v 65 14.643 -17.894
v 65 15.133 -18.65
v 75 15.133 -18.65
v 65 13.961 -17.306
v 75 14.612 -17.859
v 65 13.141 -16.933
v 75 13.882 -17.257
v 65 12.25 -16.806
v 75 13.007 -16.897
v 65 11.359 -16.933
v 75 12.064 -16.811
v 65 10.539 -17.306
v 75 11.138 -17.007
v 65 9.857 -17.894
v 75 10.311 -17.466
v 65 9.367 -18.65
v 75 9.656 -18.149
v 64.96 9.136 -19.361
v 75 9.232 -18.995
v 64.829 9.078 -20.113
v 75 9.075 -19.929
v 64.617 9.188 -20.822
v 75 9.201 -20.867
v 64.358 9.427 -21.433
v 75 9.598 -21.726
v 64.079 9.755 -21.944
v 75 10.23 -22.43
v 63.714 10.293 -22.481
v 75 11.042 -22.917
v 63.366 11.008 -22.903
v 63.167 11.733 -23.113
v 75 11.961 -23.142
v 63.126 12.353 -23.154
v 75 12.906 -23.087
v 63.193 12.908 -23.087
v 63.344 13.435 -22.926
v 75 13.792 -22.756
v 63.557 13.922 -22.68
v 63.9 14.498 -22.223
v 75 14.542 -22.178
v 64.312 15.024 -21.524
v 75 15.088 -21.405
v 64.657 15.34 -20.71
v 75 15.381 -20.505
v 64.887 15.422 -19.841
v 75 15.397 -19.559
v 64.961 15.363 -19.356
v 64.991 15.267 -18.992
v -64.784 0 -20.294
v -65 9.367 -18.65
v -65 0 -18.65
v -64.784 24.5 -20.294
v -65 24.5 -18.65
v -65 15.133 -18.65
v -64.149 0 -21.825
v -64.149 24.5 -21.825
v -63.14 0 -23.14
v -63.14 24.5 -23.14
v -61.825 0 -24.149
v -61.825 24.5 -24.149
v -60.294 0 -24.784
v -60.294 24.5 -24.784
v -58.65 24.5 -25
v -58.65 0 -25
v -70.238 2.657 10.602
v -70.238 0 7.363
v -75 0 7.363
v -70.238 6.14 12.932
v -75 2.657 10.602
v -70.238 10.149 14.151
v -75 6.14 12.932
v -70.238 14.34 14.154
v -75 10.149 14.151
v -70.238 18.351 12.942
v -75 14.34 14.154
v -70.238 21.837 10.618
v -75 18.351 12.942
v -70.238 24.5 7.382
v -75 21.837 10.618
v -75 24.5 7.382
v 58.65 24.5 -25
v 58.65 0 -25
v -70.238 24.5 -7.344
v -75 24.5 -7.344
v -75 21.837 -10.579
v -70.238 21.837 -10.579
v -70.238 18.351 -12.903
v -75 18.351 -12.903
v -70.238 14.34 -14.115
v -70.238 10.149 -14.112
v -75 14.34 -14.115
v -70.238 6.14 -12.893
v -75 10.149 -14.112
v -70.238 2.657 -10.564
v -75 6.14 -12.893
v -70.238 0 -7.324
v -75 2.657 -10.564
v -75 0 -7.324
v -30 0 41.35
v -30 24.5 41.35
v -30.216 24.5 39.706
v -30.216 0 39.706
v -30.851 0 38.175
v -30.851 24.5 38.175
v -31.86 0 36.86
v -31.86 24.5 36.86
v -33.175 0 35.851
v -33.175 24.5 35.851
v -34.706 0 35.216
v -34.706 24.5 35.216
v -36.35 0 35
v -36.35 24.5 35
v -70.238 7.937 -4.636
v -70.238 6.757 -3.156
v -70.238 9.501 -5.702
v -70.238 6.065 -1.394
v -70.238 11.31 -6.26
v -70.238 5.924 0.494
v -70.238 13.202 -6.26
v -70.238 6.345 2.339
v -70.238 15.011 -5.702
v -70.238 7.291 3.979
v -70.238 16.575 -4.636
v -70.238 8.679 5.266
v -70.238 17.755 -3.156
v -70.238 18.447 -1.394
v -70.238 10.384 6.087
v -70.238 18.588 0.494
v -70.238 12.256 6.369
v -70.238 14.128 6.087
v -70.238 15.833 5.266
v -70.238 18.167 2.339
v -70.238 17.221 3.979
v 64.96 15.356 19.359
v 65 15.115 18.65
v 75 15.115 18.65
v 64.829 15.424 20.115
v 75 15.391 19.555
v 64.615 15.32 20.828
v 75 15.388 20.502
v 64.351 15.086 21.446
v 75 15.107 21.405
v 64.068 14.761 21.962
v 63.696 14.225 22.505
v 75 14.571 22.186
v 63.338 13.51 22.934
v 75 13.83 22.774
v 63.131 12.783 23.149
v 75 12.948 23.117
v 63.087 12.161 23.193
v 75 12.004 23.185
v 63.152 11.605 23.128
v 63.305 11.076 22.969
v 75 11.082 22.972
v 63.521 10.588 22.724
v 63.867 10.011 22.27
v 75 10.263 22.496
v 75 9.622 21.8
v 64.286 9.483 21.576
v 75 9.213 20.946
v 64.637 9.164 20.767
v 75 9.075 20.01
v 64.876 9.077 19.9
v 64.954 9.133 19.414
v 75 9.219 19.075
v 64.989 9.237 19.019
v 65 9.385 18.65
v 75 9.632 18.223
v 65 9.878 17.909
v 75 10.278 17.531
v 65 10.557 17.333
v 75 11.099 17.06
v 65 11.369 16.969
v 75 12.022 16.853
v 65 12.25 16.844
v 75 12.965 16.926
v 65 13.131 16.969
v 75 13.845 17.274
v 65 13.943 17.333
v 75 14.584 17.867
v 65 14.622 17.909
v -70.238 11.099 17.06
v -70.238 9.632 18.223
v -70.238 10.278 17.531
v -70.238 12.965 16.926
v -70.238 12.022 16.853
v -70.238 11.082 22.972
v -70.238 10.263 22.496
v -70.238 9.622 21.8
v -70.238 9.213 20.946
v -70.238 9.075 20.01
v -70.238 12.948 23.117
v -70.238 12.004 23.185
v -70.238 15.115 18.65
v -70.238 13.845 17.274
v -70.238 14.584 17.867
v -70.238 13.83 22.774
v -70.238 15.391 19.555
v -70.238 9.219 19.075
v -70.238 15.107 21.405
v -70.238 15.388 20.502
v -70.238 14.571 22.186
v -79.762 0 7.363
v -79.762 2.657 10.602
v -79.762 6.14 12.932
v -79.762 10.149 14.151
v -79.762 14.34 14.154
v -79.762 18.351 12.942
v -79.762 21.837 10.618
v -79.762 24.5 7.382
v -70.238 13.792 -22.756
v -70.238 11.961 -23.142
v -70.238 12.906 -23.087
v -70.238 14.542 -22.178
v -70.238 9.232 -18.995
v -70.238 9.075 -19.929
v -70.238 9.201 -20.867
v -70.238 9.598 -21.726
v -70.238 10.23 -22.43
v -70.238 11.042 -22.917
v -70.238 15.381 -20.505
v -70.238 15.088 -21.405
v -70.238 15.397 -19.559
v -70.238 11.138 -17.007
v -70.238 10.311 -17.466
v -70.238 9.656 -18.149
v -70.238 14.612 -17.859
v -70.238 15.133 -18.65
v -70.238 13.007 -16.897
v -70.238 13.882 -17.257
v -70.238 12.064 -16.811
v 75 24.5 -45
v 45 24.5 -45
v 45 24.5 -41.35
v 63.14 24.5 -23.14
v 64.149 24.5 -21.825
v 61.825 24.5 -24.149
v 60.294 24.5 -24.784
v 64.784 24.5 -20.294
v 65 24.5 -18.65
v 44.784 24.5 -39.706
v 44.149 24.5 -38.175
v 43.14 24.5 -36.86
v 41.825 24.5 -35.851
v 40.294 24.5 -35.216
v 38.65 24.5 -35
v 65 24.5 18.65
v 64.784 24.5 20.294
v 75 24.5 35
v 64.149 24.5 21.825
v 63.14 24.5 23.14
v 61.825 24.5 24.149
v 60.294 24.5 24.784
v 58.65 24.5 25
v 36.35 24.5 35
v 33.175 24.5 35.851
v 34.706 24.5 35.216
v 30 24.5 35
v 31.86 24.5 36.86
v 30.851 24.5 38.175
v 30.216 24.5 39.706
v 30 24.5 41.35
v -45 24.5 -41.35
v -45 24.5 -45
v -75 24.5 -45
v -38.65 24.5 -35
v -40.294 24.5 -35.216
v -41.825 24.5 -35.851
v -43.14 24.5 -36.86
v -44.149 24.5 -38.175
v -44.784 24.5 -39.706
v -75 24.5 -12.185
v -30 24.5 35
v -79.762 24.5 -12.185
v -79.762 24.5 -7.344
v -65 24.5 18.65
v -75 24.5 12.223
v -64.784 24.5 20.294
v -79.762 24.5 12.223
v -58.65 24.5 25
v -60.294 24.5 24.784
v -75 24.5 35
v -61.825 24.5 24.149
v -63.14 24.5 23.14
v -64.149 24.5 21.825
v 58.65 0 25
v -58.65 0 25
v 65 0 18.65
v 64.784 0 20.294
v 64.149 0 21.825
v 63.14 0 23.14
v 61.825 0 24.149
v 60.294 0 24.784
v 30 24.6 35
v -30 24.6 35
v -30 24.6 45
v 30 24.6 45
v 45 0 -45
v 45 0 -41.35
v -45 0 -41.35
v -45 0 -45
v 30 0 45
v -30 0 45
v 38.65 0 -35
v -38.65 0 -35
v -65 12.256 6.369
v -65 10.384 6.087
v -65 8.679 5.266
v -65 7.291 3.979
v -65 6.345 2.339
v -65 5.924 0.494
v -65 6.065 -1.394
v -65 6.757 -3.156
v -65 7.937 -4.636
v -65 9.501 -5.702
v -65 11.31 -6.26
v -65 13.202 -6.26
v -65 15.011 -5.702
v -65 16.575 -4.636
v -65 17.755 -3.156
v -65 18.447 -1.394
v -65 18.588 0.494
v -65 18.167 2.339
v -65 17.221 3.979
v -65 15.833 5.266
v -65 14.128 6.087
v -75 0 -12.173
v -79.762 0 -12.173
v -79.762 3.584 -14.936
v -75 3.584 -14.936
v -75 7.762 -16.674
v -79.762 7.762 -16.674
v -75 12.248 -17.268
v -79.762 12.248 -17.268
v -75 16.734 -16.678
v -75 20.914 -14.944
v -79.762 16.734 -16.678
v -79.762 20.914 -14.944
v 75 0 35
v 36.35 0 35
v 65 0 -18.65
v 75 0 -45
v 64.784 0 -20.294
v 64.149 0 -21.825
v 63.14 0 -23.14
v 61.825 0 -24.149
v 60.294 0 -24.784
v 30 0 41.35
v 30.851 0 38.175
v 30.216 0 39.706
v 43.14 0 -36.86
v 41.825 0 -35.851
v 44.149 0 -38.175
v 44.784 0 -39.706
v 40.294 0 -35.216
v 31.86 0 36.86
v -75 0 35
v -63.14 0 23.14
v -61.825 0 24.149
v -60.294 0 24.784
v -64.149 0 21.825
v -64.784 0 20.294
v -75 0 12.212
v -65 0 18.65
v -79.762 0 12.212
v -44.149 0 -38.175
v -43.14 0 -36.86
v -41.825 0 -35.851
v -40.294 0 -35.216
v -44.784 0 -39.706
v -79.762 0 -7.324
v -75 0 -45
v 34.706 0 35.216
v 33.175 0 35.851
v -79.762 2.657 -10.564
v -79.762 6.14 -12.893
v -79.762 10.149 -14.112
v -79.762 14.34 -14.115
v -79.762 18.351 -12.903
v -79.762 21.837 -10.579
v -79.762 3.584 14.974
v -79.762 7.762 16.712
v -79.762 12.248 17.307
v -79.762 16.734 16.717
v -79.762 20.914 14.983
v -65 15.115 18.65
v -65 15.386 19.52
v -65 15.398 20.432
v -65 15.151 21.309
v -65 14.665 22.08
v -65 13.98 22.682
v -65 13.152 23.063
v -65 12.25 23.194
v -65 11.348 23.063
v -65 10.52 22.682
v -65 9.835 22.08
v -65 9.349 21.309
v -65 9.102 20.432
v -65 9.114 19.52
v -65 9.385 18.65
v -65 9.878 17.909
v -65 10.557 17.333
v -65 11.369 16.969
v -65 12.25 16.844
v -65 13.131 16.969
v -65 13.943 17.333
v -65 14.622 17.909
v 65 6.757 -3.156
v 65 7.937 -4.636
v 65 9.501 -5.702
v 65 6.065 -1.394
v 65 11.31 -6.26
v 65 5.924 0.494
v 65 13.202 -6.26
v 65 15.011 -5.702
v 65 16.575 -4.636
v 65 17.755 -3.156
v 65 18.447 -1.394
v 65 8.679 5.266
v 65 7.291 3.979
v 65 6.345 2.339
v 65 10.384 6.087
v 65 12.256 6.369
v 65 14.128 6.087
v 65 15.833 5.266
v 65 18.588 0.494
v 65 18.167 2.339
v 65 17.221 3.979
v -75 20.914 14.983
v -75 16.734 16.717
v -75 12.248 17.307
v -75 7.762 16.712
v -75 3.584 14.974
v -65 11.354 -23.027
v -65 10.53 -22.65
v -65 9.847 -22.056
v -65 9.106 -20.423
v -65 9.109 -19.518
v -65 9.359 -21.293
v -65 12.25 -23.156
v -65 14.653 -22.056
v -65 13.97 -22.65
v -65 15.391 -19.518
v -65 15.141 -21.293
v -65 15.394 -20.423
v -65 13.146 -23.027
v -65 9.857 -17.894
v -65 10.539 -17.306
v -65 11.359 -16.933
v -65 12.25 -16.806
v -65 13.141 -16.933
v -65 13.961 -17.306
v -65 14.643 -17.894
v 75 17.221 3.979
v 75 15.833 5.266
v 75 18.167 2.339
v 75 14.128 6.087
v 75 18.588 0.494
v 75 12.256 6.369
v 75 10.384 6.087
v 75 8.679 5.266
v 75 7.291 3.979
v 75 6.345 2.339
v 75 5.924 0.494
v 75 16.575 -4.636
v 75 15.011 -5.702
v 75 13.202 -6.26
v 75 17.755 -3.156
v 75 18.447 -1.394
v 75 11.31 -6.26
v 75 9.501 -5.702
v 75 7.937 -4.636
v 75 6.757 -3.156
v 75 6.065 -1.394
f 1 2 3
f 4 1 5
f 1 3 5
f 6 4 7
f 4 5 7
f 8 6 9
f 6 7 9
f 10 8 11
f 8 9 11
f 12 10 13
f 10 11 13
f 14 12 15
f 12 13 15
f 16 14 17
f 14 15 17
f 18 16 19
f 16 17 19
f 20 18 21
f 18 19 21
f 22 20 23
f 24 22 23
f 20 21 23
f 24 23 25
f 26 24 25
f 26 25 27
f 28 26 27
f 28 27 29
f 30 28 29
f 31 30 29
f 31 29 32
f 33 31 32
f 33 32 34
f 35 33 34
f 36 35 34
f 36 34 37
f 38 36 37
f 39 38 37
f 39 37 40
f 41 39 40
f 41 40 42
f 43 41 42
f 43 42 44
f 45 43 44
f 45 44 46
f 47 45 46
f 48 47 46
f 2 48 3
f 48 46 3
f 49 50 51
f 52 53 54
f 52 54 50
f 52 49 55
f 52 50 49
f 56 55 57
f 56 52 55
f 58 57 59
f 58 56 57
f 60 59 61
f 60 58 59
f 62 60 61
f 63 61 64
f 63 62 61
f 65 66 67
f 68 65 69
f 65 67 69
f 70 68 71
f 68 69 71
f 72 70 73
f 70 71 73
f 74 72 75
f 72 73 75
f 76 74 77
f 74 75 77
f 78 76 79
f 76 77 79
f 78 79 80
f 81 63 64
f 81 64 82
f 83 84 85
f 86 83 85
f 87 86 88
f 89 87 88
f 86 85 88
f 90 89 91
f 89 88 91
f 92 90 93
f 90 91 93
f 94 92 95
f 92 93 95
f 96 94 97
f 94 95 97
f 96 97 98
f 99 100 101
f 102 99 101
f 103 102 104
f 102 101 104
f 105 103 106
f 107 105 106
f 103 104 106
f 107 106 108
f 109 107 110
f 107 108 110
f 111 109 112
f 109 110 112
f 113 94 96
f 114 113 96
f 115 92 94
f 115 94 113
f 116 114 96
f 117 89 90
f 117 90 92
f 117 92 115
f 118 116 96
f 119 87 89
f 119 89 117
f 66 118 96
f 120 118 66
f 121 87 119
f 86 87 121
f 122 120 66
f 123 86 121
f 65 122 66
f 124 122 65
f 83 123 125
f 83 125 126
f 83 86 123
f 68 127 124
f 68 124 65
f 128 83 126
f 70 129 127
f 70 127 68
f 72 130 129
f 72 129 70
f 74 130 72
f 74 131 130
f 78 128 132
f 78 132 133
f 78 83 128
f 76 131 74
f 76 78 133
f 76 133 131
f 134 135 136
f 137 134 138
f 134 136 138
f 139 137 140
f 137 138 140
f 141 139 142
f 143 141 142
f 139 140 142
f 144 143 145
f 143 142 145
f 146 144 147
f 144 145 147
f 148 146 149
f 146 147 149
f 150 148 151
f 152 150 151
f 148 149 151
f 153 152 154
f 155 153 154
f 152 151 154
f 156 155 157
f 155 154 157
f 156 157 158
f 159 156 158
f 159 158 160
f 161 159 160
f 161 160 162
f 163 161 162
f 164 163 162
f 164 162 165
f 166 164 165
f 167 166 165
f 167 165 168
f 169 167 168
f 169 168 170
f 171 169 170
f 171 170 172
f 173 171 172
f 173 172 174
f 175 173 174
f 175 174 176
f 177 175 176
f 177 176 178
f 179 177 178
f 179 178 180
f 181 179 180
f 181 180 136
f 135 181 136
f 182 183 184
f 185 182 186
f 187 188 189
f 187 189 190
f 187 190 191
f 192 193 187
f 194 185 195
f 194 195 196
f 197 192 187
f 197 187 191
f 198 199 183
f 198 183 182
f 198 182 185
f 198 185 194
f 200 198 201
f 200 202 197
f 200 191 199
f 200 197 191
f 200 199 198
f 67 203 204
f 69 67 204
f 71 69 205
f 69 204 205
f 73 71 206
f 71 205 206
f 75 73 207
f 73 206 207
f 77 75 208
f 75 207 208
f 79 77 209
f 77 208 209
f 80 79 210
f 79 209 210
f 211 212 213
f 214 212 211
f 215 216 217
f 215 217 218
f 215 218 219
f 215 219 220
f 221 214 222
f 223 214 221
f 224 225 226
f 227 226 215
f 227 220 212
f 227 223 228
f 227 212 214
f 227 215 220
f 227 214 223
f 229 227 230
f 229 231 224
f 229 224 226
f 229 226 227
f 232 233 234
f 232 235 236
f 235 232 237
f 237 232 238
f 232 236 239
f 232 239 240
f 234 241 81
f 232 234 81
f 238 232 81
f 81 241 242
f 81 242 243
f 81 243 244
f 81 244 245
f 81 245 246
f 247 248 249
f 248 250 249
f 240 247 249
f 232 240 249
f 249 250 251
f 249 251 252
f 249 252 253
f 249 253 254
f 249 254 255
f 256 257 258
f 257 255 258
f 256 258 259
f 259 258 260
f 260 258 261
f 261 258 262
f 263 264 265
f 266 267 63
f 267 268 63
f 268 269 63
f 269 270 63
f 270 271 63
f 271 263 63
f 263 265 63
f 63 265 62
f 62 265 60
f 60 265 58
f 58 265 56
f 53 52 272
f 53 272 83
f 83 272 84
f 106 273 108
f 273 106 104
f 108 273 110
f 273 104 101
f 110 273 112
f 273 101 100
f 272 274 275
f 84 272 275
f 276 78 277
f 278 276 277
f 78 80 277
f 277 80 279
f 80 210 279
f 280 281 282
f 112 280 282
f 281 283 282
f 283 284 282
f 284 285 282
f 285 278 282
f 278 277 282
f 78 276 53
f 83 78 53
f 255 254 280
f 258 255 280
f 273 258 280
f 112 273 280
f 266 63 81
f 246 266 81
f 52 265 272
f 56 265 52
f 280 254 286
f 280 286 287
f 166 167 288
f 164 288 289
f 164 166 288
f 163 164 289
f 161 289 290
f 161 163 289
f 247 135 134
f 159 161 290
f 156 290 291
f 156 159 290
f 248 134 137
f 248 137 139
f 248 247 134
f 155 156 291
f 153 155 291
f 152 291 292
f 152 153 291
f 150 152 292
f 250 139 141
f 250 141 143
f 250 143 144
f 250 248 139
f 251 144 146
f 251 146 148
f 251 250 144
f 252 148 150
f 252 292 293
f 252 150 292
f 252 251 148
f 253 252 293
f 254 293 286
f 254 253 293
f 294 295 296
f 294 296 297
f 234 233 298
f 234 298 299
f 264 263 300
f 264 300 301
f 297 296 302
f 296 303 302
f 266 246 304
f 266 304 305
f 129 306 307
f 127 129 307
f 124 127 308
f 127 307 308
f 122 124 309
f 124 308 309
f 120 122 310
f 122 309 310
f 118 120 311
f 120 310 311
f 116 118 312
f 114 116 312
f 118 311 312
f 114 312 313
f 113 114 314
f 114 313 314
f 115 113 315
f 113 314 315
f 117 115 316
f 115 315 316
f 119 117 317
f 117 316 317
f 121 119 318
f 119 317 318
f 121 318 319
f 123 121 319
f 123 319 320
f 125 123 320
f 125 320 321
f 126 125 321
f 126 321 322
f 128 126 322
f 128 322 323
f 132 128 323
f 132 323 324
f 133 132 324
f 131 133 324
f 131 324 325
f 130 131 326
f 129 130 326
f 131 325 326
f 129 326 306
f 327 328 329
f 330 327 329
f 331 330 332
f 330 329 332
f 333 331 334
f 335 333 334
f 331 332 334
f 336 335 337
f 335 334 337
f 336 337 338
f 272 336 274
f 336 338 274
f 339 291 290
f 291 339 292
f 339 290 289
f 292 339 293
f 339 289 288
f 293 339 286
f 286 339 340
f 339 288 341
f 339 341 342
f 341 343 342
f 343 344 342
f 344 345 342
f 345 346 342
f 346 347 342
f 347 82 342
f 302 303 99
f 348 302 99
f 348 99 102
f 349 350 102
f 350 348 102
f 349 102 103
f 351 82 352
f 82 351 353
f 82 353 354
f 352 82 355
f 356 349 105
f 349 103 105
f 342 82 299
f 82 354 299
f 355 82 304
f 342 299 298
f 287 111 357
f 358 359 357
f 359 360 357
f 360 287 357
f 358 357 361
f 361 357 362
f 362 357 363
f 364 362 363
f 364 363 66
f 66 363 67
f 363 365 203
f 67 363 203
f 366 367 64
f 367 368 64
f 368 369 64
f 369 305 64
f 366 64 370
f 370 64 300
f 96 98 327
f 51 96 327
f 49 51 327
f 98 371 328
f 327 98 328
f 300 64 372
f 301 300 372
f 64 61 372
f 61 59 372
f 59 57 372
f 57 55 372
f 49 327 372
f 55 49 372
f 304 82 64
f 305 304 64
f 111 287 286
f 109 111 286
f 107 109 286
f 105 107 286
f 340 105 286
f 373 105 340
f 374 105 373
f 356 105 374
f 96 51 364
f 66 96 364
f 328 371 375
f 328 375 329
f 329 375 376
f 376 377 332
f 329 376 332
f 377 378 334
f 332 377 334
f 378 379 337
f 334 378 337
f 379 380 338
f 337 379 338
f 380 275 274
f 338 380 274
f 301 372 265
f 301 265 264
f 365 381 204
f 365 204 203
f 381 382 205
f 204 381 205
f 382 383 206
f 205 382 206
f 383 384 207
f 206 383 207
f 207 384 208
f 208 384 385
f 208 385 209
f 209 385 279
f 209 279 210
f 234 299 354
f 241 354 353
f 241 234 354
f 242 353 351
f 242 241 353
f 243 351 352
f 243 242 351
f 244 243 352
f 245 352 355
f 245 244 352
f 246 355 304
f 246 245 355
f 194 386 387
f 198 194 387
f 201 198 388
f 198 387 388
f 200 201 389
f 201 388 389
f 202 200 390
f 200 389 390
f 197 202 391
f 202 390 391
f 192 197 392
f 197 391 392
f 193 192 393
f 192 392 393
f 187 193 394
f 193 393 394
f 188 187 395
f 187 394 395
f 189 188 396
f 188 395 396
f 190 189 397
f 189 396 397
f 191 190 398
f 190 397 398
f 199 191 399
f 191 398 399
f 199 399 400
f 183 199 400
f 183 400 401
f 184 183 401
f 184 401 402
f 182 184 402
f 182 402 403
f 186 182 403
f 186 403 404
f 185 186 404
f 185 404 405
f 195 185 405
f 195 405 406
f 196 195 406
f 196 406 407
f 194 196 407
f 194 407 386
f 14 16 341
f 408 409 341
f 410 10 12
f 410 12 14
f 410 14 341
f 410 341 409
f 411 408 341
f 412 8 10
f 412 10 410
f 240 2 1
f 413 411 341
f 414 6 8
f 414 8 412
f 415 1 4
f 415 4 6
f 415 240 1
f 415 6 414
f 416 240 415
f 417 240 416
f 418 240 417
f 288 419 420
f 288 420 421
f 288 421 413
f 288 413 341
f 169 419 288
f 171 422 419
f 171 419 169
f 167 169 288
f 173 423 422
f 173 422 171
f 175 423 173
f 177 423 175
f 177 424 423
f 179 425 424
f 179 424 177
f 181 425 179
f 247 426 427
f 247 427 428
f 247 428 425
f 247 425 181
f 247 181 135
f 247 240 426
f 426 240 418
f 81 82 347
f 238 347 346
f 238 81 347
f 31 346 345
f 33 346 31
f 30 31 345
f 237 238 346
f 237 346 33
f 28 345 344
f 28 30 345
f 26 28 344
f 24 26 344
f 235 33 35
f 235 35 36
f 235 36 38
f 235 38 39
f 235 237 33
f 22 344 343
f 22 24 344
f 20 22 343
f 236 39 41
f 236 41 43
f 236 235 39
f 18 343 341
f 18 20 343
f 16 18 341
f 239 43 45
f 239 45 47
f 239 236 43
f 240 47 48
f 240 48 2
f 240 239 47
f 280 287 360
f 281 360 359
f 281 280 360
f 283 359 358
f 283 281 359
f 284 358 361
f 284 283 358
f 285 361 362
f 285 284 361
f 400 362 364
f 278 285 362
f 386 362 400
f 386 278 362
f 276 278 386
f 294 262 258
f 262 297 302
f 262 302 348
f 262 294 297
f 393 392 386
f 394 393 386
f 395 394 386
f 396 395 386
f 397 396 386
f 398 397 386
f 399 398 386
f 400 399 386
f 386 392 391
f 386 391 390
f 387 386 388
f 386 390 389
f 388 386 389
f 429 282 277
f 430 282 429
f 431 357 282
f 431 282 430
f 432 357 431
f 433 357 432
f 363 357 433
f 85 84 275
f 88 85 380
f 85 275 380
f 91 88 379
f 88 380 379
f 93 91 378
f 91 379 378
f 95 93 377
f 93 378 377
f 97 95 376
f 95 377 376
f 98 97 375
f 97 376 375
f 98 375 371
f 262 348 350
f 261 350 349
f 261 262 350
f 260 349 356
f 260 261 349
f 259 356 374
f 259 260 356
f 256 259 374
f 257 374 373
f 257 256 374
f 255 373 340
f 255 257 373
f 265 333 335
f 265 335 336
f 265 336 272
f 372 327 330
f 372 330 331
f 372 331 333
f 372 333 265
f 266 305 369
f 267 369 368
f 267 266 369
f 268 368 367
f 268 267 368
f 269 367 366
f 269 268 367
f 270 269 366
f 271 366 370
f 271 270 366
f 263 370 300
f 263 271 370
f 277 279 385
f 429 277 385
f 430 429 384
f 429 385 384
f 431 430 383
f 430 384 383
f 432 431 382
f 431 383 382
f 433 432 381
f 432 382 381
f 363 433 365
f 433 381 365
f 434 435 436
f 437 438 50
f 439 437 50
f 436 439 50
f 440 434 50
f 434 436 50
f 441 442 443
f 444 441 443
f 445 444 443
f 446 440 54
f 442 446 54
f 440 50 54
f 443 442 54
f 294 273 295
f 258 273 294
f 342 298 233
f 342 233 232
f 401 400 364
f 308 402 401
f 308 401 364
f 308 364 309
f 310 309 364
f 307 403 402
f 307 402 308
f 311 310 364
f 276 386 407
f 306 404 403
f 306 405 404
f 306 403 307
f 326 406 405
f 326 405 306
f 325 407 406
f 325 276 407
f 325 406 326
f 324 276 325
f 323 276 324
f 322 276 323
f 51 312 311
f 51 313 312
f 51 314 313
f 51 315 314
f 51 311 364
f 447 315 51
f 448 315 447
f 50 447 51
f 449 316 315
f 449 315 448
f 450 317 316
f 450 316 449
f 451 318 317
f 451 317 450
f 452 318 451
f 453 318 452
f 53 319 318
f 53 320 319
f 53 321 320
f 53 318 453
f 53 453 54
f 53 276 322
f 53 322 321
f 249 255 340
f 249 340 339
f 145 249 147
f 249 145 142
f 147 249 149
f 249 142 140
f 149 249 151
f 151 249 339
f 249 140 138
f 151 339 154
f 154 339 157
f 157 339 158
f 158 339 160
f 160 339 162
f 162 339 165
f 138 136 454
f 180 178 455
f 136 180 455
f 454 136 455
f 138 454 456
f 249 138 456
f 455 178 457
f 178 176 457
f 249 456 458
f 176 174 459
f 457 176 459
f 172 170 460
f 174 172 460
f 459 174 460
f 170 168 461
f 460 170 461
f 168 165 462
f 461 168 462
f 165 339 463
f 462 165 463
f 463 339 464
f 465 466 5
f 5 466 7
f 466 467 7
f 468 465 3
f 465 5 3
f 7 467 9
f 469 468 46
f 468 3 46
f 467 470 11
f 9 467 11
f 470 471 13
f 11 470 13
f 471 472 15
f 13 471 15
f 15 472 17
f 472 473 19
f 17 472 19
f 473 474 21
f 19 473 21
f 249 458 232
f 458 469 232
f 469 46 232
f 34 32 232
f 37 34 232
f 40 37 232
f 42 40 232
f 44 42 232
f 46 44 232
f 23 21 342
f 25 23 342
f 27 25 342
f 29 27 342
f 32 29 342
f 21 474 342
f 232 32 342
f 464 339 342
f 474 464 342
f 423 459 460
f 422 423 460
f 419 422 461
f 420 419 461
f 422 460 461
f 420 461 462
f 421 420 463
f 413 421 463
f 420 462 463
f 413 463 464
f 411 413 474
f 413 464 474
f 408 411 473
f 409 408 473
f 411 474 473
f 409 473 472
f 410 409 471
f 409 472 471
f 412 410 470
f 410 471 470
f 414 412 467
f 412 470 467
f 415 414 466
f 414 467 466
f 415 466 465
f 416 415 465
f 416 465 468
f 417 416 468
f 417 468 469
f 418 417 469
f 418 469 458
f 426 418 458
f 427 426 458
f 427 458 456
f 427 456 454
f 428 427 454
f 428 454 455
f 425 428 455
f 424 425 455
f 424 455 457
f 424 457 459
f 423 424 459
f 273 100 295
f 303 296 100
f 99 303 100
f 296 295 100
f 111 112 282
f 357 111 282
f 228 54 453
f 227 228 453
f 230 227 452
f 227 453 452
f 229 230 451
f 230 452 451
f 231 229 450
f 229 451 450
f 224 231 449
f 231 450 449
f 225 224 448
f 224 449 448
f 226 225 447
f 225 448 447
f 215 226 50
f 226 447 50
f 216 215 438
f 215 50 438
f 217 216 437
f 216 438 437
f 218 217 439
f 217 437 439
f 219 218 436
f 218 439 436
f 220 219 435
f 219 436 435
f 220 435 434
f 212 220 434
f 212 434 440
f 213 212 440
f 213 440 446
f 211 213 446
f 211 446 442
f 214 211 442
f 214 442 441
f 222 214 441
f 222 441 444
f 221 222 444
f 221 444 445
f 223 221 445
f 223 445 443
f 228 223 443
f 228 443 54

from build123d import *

# Parameters (mm, degrees)
CROQUIS1_W              = 150
CROQUIS1_H              = 90
SALIENTE_EXTRUIR1_DEPTH = 24.5
CORTAR_EXTRUIR2_DEPTH   = 91.830886817
CROQUIS6_R              = 14.2875
CORTAR_EXTRUIR3_DEPTH   = 4.7625
CORTAR_EXTRUIR4_START   = -140
CROQUIS2_R              = 6.35
CROQUIS2_R_2            = 3.175
CORTAR_EXTRUIR4_DEPTH   = 5.2375
CORTAR_EXTRUIR1_DEPTH   = 41
SALIENTE_EXTRUIR2_START = 4.7625
SALIENTE_EXTRUIR2_DEPTH = 4.7625
CROQUIS8_W              = 60
CROQUIS8_H              = 10
SALIENTE_EXTRUIR3_DEPTH = 0.1


with BuildPart() as part:
    # Croquis1 → Saliente-Extruir1 (new body)
    with BuildSketch(Plane(origin=(0, 0, 0), x_dir=(1, 0, 0), z_dir=(0, 1, 0))):
        Rectangle(CROQUIS1_W, CROQUIS1_H)
    extrude(amount=SALIENTE_EXTRUIR1_DEPTH)

    # Croquis3 → Cortar-Extruir2 (cut, through all)
    with BuildSketch(Plane(origin=(0, 24.5, 0), x_dir=(1, 0, 0), z_dir=(0, 1, 0))):
        with BuildLine():
            Line((58.65, -25), (-58.65, -25))
            ThreePointArc((-58.65, -25), (-63.140128061, -23.140128061), (-65, -18.65))
            Line((-65, -18.65), (-65, 18.65))
            ThreePointArc((-65, 18.65), (-63.140128061, 23.140128061), (-58.65, 25))
            Line((-58.65, 25), (58.65, 25))
            ThreePointArc((58.65, 25), (63.140128061, 23.140128061), (65, 18.65))
            Line((65, 18.65), (65, -18.65))
            ThreePointArc((65, -18.65), (63.140128061, -23.140128061), (58.65, -25))
        make_face()
        with BuildLine():
            Line((-75, -45), (-30, -45))
            Line((-30, -45), (-30, -41.35))
            ThreePointArc((-30, -41.35), (-31.859871939, -36.859871939), (-36.35, -35))
            Line((-36.35, -35), (-75, -35))
            Line((-75, -35), (-75, -45))
        make_face()
        with BuildLine():
            Line((75, -45), (30, -45))
            Line((30, -45), (30, -41.35))
            ThreePointArc((30, -41.35), (31.859871939, -36.859871939), (36.35, -35))
            Line((36.35, -35), (75, -35))
            Line((75, -35), (75, -45))
        make_face()
        with BuildLine():
            Line((-45, 45), (45, 45))
            Line((45, 45), (45, 41.35))
            ThreePointArc((45, 41.35), (43.140128061, 36.859871939), (38.65, 35))
            Line((38.65, 35), (-38.65, 35))
            ThreePointArc((-38.65, 35), (-43.140128061, 36.859871939), (-45, 41.35))
            Line((-45, 41.35), (-45, 45))
        make_face()
    extrude(amount=-CORTAR_EXTRUIR2_DEPTH, mode=Mode.SUBTRACT)

    # Croquis6 → Cortar-Extruir3 (cut)
    with BuildSketch(Plane.ZY.offset(75)):
        with Locations((0.019345319, 12.255943197)):
            Circle(CROQUIS6_R)
    extrude(amount=-CORTAR_EXTRUIR3_DEPTH, mode=Mode.SUBTRACT)

    # Croquis2 → Cortar-Extruir4 (cut)
    with BuildSketch(Plane(origin=(75, 0, 0), x_dir=(0, 0, -1), z_dir=(1, 0, 0)).offset(CORTAR_EXTRUIR4_START)):
        with Locations(Location((-0.019345319, 12.255943197, 0), (0, 0, 180))):
            Circle(CROQUIS2_R)
        with Locations(Location((-20.019346202, 12.25, 0), (0, 0, 64.450536277))):
            Circle(CROQUIS2_R_2)
        with Locations(Location((19.980653798, 12.25, 0), (0, 0, 114.778004308))):
            Circle(CROQUIS2_R_2)
    extrude(amount=-CORTAR_EXTRUIR4_DEPTH, mode=Mode.SUBTRACT)

    # Croquis2 → Cortar-Extruir1 (cut)
    with BuildSketch(Plane(origin=(75, 0, 0), x_dir=(0, 0, -1), z_dir=(1, 0, 0))):
        with Locations(Location((-0.019345319, 12.255943197, 0), (0, 0, 180))):
            Circle(CROQUIS2_R)
        with Locations(Location((-20.019346202, 12.25, 0), (0, 0, 64.450536277))):
            Circle(CROQUIS2_R_2)
        with Locations(Location((19.980653798, 12.25, 0), (0, 0, 114.778004308))):
            Circle(CROQUIS2_R_2)
    extrude(amount=-CORTAR_EXTRUIR1_DEPTH, mode=Mode.SUBTRACT)

    # Croquis7 → Saliente-Extruir2 (add)
    with BuildSketch(Plane.ZY.offset(75).offset(SALIENTE_EXTRUIR2_START)):
        with BuildLine():
            Line((-12.18478223, 24.5), (-7.343787794, 24.5))
            ThreePointArc((-7.343787794, 24.5), (-14.268150014, 12.244395432), (-7.323985846, 0))
            Line((-7.323985846, 0), (-12.172845321, 0))
            ThreePointArc((-12.172845321, 0), (-17.268152629, 12.247520368), (-12.18478223, 24.5))
        make_face()
        with BuildLine():
            Line((7.382478433, 24.5), (12.223472869, 24.5))
            ThreePointArc((12.223472869, 24.5), (17.306843268, 12.247520368), (12.21153596, 0))
            Line((12.21153596, 0), (7.362676485, 0))
            ThreePointArc((7.362676485, 0), (14.306840653, 12.244395432), (7.382478433, 24.5))
        make_face()
    extrude(amount=-SALIENTE_EXTRUIR2_DEPTH)

    # Croquis8 → Saliente-Extruir3 (add)
    with BuildSketch(Plane(origin=(0, 24.5, 0), x_dir=(1, 0, 0), z_dir=(0, 1, 0))):
        with Locations((0, -40)):
            Rectangle(CROQUIS8_W, CROQUIS8_H)
    extrude(amount=SALIENTE_EXTRUIR3_DEPTH)


solid = part.part
